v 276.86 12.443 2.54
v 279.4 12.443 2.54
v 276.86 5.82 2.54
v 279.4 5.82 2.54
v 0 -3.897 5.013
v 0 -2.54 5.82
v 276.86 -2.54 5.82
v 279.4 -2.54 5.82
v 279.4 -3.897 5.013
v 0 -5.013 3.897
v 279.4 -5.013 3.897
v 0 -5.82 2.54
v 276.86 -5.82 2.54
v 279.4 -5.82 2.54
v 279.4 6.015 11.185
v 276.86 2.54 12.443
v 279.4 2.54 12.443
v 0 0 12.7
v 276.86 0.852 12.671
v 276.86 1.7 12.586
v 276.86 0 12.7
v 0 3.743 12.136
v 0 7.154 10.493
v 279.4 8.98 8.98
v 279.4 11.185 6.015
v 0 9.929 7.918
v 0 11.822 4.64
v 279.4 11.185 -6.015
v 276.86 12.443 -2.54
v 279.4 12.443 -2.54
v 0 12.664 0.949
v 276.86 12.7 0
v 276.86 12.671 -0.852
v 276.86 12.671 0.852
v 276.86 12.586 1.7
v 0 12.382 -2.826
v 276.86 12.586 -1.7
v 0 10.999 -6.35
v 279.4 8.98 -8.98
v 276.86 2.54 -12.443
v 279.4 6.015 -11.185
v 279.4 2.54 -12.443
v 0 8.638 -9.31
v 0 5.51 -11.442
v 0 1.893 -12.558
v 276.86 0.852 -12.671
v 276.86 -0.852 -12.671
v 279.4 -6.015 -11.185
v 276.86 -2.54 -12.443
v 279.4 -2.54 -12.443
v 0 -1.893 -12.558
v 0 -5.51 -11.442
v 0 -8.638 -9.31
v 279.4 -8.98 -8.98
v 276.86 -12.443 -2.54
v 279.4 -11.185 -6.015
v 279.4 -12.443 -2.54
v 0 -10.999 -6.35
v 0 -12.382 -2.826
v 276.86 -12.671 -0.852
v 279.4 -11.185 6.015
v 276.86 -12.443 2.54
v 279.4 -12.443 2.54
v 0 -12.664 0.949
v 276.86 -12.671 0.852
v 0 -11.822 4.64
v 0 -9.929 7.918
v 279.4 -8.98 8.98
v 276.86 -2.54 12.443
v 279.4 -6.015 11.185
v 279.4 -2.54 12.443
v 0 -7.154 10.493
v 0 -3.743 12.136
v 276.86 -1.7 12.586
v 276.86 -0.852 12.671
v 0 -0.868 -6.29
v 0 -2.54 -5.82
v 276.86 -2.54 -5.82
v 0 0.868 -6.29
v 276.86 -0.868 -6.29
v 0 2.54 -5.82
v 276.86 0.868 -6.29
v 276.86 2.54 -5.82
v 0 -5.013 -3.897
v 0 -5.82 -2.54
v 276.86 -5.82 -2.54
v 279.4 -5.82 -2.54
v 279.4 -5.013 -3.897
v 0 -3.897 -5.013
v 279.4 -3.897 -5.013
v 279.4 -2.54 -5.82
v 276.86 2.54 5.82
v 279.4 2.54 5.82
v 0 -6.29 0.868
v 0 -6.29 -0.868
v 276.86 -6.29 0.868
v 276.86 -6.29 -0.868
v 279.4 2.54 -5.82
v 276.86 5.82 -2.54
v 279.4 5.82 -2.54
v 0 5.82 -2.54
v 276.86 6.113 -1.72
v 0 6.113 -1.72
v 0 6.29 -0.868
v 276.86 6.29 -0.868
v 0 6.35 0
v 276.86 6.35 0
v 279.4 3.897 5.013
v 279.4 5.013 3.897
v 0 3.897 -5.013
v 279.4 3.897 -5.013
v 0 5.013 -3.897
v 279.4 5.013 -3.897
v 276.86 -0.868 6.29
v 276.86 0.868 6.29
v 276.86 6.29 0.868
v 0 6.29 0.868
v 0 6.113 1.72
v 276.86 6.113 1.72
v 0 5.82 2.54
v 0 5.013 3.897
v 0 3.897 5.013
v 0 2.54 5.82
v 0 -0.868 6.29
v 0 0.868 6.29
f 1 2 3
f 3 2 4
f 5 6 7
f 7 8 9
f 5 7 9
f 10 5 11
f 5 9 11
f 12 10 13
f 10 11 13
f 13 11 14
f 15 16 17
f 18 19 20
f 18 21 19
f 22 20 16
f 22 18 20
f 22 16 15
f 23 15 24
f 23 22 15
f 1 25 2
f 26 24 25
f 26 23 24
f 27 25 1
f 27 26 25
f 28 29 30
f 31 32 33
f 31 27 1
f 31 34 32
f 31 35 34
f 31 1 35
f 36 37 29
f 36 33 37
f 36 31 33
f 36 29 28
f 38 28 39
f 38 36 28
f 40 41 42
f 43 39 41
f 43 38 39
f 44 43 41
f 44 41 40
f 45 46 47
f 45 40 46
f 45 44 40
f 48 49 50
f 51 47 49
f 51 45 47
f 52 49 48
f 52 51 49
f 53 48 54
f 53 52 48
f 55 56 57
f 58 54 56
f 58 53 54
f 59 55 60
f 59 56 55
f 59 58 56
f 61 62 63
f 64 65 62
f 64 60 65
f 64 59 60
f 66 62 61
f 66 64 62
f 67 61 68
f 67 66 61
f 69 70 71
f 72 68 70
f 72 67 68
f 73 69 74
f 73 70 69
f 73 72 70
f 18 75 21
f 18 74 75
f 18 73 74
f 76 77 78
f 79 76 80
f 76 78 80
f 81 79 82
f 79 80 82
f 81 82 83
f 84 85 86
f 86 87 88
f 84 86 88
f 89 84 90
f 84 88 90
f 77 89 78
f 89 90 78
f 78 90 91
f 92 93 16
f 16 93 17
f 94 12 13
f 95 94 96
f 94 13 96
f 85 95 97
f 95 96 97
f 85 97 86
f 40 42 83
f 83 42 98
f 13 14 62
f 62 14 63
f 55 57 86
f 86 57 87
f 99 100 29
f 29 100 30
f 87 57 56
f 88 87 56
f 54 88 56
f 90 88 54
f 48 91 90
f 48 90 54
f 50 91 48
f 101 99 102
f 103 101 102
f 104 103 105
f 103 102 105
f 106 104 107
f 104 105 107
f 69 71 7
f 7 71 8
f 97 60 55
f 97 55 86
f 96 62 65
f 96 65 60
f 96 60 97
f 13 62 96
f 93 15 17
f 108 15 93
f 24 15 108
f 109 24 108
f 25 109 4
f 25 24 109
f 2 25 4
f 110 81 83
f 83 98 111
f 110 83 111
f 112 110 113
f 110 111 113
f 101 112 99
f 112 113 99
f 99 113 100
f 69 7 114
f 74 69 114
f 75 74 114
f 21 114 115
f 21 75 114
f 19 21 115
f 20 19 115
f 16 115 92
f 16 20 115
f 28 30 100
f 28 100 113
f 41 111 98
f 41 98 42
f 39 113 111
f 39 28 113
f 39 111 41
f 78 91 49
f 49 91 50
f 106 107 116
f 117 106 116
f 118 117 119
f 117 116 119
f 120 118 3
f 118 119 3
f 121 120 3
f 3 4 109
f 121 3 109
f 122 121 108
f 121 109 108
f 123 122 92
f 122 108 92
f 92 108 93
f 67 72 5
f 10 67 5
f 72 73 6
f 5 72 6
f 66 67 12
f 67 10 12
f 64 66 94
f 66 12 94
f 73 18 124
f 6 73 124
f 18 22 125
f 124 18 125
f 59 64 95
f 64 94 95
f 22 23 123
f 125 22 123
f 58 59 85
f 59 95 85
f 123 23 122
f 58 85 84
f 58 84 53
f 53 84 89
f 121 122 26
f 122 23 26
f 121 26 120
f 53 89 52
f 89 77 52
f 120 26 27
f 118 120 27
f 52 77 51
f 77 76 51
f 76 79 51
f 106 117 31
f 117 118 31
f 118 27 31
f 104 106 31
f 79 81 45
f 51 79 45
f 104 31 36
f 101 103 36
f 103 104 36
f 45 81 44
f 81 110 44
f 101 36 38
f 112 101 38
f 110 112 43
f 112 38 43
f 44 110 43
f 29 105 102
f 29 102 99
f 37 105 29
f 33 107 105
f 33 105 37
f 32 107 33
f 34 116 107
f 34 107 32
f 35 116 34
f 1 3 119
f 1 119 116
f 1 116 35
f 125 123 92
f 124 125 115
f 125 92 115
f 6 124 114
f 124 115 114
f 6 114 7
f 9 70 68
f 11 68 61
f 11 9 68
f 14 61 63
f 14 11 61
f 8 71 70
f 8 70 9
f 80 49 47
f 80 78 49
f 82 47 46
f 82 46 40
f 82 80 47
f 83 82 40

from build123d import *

# Parameters (mm, degrees)
F0_W     = 52.451
F0_H     = 12.7
F0_W_2   = 207.899
F0_W_3   = 19.05
F3_DEPTH = 2.54
F4_DEPTH = 279.401


with BuildPart() as f1:
    # F0 (on Front) → F1 (revolve)
    with BuildSketch(Plane.XZ):
        with Locations((26.2255, 6.35)):
            Rectangle(F0_W, F0_H)
        with Locations((156.4005, 6.35)):
            Rectangle(F0_W_2, F0_H)
        with Locations((269.875, 6.35)):
            Rectangle(F0_W_3, F0_H)
    revolve(axis=Axis((26.2255, 0, 0), (-1, 0, 0)))

    # F2 (on face) → F3 (cut)
    with BuildSketch(Plane.YZ.offset(279.4)):
        with BuildLine():
            Line((2.54, 5.819871), (2.54, 12.443408))
            ThreePointArc((2.54, 12.443408), (0, 12.7), (-2.54, 12.443408))
            Line((-2.54, 12.443408), (-2.54, 5.819871))
            ThreePointArc((-2.54, 5.819871), (0, 6.35), (2.54, 5.819871))
        make_face()
        with BuildLine():
            Line((-5.819871, 2.54), (-12.443408, 2.54))
            ThreePointArc((-12.443408, 2.54), (-12.7, 0), (-12.443408, -2.54))
            Line((-12.443408, -2.54), (-5.819871, -2.54))
            ThreePointArc((-5.819871, -2.54), (-6.35, 0), (-5.819871, 2.54))
        make_face()
        with BuildLine():
            ThreePointArc((12.443408, -2.54), (12.635689, -1.276464), (12.7, 0))
            ThreePointArc((12.7, 0), (12.635689, 1.276464), (12.443408, 2.54))
            Line((12.443408, 2.54), (5.819871, 2.54))
            ThreePointArc((5.819871, 2.54), (6.216055, 1.297366), (6.35, 0))
            ThreePointArc((6.35, 0), (6.216055, -1.297366), (5.819871, -2.54))
            Line((5.819871, -2.54), (12.443408, -2.54))
        make_face()
        with BuildLine():
            ThreePointArc((-2.54, -12.443408), (0, -12.7), (2.54, -12.443408))
            Line((2.54, -12.443408), (2.54, -5.819871))
            ThreePointArc((2.54, -5.819871), (0, -6.35), (-2.54, -5.819871))
            Line((-2.54, -5.819871), (-2.54, -12.443408))
        make_face()
    extrude(amount=-F3_DEPTH, mode=Mode.SUBTRACT)

    # F2 (on face) → F4 (cut, through all)
    with BuildSketch(Plane.YZ.offset(279.4)):
        with BuildLine():
            ThreePointArc((6.35, 0), (6.216055, 1.297366), (5.819871, 2.54))
            ThreePointArc((5.819871, 2.54), (4.490128, 4.490128), (2.54, 5.819871))
            ThreePointArc((2.54, 5.819871), (0, 6.35), (-2.54, 5.819871))
            ThreePointArc((-2.54, 5.819871), (-4.490128, 4.490128), (-5.819871, 2.54))
            ThreePointArc((-5.819871, 2.54), (-6.35, 0), (-5.819871, -2.54))
            ThreePointArc((-5.819871, -2.54), (-4.490128, -4.490128), (-2.54, -5.819871))
            ThreePointArc((-2.54, -5.819871), (0, -6.35), (2.54, -5.819871))
            ThreePointArc((2.54, -5.819871), (4.490128, -4.490128), (5.819871, -2.54))
            ThreePointArc((5.819871, -2.54), (6.216055, -1.297366), (6.35, 0))
        make_face()
    extrude(amount=-F4_DEPTH, mode=Mode.SUBTRACT)


solid = f1.part
